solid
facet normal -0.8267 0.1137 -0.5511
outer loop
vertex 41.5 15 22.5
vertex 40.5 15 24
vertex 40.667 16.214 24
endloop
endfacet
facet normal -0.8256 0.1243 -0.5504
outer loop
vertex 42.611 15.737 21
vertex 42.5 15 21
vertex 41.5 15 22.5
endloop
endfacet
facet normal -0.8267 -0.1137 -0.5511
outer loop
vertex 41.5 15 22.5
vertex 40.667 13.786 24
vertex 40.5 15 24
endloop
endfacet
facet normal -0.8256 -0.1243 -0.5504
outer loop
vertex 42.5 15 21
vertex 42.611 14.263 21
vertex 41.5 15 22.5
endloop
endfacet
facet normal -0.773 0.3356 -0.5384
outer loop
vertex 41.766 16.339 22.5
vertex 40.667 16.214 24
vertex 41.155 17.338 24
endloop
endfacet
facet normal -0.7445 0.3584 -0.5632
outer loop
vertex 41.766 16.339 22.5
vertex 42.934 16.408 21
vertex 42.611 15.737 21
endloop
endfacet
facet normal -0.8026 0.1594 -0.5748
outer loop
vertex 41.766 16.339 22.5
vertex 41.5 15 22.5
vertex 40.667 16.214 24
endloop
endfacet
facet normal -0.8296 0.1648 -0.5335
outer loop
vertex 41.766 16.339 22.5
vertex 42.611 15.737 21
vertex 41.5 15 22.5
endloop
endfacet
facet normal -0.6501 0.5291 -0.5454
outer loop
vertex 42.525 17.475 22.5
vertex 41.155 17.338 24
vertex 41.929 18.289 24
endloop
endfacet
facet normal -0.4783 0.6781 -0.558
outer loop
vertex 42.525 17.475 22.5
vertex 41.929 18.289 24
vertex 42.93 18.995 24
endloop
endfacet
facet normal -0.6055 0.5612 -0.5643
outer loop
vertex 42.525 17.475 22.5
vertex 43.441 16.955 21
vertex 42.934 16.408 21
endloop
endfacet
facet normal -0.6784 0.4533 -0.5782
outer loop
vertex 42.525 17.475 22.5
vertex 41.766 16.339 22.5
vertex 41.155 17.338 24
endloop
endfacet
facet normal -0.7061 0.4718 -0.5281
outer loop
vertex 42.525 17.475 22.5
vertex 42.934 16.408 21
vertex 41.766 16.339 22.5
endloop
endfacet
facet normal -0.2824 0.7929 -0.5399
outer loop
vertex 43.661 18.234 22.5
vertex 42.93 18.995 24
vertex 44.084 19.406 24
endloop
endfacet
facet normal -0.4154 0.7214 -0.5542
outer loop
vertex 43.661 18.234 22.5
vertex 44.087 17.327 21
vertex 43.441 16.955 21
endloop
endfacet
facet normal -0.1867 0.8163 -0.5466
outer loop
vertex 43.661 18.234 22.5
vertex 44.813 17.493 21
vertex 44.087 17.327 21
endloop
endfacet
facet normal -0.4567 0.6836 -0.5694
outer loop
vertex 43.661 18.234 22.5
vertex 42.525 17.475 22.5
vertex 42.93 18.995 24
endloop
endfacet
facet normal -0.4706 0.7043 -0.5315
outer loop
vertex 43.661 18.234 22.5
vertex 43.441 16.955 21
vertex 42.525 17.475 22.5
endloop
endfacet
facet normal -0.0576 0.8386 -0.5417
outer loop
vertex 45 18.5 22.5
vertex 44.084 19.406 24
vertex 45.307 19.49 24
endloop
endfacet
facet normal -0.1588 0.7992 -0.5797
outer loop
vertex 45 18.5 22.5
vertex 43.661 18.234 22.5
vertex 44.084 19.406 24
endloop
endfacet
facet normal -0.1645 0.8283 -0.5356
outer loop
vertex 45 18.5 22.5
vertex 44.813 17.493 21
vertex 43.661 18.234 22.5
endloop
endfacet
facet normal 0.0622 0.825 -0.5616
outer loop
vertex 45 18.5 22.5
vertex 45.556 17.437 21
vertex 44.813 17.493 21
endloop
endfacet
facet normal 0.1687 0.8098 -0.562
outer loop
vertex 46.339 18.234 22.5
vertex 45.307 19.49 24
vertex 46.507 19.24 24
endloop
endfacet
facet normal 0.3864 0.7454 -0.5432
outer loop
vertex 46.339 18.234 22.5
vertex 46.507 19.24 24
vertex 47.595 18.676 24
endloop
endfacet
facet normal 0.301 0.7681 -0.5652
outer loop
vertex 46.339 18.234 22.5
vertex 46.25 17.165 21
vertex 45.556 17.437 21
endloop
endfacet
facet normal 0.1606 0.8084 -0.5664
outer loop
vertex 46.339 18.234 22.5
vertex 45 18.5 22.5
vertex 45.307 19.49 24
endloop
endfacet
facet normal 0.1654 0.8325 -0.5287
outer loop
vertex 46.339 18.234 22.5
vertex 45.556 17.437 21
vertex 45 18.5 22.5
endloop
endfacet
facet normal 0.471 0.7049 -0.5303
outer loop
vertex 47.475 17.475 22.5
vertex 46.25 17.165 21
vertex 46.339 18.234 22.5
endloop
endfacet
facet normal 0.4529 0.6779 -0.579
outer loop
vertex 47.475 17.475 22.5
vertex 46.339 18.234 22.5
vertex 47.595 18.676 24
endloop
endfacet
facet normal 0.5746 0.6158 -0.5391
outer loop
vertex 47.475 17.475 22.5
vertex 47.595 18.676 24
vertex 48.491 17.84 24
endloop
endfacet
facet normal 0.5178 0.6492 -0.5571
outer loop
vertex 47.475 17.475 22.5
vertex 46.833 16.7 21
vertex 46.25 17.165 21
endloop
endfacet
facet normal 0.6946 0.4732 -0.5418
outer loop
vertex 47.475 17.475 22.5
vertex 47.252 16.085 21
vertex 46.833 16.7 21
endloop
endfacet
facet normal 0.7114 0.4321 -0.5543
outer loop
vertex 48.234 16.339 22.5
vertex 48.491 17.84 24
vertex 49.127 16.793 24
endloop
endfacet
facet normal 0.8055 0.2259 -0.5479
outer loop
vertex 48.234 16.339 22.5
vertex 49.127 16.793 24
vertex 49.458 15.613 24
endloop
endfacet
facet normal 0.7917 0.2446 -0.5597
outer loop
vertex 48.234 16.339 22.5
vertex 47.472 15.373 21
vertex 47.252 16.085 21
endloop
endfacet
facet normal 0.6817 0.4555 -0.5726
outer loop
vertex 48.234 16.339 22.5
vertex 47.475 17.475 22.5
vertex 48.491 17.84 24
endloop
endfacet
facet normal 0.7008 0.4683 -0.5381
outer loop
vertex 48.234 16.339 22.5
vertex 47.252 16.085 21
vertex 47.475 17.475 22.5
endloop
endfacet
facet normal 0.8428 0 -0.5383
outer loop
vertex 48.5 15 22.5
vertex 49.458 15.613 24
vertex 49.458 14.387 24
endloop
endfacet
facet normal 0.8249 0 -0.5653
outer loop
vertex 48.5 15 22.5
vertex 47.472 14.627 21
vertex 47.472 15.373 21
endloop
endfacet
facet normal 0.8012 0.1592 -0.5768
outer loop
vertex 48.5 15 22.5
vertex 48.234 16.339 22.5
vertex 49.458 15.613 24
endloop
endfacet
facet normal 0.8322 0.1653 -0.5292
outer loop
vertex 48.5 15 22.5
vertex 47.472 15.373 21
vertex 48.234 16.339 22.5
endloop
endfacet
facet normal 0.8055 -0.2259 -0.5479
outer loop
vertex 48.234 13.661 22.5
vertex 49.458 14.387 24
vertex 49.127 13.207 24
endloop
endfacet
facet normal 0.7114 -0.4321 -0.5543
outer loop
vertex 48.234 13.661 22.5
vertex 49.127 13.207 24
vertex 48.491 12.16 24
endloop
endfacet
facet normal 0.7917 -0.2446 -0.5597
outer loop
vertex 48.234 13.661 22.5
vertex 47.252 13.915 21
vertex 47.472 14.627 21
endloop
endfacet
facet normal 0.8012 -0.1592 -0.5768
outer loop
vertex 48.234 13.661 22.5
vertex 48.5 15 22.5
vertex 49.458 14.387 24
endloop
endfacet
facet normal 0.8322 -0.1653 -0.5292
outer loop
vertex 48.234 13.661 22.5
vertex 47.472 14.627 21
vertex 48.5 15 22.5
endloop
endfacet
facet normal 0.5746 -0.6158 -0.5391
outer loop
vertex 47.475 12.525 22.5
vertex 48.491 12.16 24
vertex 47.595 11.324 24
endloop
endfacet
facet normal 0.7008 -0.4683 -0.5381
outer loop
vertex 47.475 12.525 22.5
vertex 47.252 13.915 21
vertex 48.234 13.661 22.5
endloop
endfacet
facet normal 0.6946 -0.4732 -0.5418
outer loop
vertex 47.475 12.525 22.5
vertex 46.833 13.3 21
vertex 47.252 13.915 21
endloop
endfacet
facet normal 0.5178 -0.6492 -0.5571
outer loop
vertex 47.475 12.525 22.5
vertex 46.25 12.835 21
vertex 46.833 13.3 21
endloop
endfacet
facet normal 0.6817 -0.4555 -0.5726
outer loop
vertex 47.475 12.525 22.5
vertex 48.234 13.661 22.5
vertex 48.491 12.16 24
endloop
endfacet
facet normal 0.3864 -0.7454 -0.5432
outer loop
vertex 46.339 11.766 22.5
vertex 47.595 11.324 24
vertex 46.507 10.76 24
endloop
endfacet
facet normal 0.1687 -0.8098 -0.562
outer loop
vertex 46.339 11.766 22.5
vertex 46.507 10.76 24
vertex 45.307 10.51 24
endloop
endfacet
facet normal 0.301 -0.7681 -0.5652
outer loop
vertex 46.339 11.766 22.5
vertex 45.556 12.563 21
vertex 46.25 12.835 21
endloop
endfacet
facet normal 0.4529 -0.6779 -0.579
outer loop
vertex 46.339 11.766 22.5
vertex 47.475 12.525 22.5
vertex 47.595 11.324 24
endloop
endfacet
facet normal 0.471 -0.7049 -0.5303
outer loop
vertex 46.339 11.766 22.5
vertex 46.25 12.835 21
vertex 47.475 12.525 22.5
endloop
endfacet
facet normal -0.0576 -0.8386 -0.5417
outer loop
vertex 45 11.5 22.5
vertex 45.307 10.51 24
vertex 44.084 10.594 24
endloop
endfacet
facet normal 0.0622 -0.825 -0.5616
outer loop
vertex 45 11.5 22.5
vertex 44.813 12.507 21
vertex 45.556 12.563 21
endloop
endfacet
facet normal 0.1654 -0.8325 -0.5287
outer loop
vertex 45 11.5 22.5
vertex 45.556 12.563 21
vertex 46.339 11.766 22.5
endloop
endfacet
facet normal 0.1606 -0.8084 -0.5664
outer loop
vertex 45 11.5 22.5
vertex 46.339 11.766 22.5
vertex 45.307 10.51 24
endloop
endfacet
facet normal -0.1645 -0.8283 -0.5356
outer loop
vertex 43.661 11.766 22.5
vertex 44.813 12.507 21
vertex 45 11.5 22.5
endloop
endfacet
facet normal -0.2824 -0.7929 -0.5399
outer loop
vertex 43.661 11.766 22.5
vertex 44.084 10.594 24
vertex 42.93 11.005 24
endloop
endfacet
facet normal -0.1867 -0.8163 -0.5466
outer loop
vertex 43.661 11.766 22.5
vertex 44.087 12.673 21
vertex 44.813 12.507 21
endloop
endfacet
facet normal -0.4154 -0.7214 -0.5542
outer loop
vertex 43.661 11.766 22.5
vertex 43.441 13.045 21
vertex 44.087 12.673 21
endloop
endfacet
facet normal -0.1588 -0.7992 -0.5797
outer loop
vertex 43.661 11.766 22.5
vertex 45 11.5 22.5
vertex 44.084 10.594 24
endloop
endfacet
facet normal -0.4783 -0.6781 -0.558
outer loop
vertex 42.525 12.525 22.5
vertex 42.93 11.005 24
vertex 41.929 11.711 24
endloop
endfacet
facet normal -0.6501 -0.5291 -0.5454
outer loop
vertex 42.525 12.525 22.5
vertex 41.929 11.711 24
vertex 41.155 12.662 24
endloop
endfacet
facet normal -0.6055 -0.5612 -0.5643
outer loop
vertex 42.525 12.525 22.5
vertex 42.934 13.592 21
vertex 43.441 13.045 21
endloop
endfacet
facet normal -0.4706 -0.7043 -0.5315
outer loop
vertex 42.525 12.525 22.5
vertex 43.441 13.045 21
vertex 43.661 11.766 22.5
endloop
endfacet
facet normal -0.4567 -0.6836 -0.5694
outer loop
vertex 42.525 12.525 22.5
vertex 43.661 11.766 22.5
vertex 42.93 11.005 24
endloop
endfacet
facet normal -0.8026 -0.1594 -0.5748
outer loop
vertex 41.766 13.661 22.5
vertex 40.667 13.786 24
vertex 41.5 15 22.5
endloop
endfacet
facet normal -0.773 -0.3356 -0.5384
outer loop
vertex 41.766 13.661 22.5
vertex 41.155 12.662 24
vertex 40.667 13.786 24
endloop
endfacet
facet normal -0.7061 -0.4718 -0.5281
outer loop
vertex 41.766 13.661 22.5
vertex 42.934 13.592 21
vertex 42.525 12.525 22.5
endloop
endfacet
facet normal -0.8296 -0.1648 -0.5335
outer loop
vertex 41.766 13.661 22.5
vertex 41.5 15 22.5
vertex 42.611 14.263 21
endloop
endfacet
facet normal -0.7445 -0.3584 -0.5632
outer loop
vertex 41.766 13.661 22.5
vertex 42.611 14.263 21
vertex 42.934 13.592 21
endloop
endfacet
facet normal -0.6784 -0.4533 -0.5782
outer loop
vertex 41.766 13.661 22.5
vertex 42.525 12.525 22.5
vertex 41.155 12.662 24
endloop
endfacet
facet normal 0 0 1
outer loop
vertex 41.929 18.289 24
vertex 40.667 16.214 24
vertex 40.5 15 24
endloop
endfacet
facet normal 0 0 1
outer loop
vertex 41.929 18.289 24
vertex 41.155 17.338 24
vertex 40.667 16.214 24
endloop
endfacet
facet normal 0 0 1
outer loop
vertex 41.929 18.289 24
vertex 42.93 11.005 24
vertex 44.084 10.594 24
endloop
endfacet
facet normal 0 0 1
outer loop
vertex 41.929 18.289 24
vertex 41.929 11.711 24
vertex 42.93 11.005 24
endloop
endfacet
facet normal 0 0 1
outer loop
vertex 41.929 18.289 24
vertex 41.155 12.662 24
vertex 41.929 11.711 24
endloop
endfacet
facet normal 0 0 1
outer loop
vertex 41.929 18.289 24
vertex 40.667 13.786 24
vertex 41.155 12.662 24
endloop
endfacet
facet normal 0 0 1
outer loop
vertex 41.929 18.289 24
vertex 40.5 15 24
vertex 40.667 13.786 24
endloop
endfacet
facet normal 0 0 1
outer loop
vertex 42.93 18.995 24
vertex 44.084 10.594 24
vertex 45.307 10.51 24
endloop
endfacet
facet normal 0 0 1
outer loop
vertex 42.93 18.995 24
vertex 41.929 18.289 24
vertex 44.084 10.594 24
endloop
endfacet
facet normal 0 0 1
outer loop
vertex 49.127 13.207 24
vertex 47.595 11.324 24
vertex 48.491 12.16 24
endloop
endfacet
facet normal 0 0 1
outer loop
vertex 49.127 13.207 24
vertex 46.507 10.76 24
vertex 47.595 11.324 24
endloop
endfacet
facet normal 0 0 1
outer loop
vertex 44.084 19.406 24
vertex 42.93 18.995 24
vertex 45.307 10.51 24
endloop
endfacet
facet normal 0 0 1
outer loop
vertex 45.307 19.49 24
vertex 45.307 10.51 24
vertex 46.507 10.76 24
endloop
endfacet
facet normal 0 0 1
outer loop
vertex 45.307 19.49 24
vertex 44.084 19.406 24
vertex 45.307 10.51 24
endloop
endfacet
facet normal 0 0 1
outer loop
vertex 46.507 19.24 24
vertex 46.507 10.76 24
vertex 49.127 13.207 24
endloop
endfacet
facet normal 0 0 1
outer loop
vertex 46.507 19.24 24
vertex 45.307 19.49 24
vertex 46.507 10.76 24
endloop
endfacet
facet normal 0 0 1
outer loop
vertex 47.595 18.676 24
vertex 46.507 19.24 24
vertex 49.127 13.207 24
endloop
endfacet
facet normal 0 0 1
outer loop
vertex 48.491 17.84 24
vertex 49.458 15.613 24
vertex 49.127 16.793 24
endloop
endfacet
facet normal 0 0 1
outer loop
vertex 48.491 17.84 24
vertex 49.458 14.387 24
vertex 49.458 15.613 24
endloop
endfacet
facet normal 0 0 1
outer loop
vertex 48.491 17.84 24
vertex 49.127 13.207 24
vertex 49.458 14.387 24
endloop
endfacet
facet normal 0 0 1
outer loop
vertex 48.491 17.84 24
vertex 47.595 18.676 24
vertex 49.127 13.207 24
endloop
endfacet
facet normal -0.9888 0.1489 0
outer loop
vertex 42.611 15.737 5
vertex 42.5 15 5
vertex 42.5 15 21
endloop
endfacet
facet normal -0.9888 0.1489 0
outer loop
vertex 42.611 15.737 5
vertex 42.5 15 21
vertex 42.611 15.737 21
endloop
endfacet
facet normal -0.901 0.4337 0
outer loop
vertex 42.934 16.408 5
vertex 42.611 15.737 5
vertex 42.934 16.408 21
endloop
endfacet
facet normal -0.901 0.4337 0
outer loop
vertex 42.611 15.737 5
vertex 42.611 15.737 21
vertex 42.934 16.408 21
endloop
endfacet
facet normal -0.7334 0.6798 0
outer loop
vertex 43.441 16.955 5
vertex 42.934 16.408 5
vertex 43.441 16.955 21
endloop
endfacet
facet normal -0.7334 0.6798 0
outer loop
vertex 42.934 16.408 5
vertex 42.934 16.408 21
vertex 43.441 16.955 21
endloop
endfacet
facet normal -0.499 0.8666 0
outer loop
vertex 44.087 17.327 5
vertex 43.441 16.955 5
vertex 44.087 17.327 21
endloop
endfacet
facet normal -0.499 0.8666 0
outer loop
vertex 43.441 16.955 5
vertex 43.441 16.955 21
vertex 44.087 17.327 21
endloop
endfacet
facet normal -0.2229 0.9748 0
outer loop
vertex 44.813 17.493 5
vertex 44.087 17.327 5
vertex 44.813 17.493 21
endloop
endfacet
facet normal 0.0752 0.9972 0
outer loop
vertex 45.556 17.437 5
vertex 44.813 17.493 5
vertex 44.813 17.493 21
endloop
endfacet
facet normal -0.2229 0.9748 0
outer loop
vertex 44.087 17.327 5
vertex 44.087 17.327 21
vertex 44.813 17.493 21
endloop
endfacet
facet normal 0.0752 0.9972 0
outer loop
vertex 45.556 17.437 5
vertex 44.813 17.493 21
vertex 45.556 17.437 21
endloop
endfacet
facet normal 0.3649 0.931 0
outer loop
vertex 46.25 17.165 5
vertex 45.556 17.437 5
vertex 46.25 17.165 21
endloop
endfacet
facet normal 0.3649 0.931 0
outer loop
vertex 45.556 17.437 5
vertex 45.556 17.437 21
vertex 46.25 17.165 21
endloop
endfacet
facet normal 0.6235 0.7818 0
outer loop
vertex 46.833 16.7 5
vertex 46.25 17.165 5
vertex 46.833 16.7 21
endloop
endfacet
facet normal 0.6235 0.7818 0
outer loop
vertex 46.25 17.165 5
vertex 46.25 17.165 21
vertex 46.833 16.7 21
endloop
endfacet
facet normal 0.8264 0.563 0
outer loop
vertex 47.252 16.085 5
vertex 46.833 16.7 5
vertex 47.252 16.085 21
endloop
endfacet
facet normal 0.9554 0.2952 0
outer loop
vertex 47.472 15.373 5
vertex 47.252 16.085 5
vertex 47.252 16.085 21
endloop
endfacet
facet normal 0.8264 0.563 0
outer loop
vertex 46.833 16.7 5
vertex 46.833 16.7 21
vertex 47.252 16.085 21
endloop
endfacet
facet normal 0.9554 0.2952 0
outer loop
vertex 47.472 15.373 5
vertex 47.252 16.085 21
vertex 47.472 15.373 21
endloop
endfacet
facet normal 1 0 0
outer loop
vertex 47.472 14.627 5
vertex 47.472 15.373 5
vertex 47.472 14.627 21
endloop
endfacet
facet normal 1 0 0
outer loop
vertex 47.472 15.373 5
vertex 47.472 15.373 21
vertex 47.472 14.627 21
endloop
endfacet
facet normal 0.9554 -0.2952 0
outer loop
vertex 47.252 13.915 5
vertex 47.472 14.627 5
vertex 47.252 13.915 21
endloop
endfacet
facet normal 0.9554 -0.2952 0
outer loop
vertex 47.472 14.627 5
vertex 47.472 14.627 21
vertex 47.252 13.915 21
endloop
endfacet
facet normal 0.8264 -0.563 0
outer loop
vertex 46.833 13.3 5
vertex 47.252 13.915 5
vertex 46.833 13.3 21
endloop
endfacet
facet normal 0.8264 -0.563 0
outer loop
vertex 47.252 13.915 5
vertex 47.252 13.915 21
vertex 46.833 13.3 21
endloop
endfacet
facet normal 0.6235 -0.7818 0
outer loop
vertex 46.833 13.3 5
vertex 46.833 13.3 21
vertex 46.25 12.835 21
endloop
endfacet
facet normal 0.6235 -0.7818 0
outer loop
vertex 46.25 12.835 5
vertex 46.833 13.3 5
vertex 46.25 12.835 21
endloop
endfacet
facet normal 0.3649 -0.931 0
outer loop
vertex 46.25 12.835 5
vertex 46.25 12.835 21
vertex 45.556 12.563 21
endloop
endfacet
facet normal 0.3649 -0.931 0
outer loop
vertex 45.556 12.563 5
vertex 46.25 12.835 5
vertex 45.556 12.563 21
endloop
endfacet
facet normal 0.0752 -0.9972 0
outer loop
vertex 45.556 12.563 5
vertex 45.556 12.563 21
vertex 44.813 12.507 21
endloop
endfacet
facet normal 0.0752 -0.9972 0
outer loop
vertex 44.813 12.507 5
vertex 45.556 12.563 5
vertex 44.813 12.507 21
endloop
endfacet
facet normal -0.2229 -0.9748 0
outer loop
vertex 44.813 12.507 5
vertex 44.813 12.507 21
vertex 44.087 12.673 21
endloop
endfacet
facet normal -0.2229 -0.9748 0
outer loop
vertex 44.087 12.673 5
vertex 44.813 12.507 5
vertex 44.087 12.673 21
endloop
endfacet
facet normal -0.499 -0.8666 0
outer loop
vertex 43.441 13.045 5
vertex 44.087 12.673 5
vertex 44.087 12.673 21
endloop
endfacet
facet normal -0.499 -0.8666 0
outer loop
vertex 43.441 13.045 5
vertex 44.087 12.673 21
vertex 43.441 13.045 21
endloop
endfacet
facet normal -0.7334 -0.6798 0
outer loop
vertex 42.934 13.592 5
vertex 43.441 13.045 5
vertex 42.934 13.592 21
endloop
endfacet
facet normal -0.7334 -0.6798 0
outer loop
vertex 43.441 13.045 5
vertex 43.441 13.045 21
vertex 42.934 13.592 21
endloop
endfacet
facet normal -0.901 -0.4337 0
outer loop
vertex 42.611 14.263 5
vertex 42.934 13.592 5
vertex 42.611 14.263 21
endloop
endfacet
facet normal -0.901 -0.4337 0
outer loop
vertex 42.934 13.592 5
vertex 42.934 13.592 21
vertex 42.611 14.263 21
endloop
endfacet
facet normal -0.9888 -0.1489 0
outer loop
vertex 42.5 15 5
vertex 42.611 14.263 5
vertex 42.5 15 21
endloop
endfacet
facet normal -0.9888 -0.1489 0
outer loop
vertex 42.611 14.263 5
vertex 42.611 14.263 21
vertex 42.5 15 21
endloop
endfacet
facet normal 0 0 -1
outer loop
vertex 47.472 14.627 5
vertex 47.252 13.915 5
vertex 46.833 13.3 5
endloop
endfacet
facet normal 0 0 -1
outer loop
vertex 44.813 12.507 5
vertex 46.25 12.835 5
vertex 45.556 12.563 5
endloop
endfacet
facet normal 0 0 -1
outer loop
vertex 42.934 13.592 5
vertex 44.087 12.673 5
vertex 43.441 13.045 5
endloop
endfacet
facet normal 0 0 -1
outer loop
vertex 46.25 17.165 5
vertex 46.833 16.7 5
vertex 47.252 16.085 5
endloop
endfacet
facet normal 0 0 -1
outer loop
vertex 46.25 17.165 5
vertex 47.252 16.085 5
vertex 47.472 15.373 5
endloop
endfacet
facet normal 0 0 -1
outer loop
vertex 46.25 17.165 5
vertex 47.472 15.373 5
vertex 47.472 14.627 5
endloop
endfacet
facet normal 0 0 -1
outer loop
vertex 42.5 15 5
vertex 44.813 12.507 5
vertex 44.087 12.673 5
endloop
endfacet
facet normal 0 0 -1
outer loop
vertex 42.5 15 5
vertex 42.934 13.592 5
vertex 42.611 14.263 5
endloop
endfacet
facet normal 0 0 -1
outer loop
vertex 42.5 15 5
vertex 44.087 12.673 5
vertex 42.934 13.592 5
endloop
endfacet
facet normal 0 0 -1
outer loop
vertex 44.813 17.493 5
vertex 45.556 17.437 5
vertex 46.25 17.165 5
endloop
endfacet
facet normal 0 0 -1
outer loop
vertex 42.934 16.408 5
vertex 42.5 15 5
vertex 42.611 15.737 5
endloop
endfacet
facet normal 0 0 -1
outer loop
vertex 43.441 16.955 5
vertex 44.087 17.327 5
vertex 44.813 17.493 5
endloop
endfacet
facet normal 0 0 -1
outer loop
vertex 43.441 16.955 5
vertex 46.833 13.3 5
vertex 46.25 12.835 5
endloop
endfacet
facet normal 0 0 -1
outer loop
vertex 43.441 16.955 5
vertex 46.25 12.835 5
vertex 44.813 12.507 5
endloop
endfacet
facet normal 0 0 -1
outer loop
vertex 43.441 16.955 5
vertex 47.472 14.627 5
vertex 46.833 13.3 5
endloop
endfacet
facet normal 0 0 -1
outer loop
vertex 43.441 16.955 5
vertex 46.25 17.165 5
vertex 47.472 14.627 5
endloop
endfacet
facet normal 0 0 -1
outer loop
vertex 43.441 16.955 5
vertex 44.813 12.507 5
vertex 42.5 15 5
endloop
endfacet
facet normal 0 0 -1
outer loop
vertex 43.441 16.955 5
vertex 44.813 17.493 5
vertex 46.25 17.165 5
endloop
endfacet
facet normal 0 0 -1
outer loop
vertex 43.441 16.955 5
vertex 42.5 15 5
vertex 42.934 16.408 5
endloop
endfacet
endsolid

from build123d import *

# Parameters (mm, degrees)
CYLINDER011_R                   = 2.5
CYLINDER011_DEPTH               = 16
FUSION001018017_PLACEMENT_ANGLE = 180


with BuildPart() as cone003:
    # Cone003 → Cone003 (revolve)
    with BuildSketch(Plane(origin=(0, 0, -3), x_dir=(1, 0, 0), z_dir=(0, -1, 0))):
        Polygon((0, 0), (4.5, 0), (2.5, 3), (0, 3), align=None)
    revolve(axis=Axis((0, 0, -3), (0, 0, 1)))


with BuildPart() as clone_of_m5x16_senkkopf008:
    # Cylinder011 → Cylinder011 (new body)
    with BuildSketch(Plane.XY):
        Circle(CYLINDER011_R)
    extrude(amount=CYLINDER011_DEPTH)

    # Fusion001018017: union Cone003
    add(cone003.part)


with BuildPart() as clone_of_m5x16_senkkopf008_1:
    # Fusion001018017 placement: moved
    add(clone_of_m5x16_senkkopf008.part.moved(Location((45, 15, 21))).rotate(Axis((45, 15, 21), (0, 1, 0)), FUSION001018017_PLACEMENT_ANGLE))


solid = clone_of_m5x16_senkkopf008_1.part
